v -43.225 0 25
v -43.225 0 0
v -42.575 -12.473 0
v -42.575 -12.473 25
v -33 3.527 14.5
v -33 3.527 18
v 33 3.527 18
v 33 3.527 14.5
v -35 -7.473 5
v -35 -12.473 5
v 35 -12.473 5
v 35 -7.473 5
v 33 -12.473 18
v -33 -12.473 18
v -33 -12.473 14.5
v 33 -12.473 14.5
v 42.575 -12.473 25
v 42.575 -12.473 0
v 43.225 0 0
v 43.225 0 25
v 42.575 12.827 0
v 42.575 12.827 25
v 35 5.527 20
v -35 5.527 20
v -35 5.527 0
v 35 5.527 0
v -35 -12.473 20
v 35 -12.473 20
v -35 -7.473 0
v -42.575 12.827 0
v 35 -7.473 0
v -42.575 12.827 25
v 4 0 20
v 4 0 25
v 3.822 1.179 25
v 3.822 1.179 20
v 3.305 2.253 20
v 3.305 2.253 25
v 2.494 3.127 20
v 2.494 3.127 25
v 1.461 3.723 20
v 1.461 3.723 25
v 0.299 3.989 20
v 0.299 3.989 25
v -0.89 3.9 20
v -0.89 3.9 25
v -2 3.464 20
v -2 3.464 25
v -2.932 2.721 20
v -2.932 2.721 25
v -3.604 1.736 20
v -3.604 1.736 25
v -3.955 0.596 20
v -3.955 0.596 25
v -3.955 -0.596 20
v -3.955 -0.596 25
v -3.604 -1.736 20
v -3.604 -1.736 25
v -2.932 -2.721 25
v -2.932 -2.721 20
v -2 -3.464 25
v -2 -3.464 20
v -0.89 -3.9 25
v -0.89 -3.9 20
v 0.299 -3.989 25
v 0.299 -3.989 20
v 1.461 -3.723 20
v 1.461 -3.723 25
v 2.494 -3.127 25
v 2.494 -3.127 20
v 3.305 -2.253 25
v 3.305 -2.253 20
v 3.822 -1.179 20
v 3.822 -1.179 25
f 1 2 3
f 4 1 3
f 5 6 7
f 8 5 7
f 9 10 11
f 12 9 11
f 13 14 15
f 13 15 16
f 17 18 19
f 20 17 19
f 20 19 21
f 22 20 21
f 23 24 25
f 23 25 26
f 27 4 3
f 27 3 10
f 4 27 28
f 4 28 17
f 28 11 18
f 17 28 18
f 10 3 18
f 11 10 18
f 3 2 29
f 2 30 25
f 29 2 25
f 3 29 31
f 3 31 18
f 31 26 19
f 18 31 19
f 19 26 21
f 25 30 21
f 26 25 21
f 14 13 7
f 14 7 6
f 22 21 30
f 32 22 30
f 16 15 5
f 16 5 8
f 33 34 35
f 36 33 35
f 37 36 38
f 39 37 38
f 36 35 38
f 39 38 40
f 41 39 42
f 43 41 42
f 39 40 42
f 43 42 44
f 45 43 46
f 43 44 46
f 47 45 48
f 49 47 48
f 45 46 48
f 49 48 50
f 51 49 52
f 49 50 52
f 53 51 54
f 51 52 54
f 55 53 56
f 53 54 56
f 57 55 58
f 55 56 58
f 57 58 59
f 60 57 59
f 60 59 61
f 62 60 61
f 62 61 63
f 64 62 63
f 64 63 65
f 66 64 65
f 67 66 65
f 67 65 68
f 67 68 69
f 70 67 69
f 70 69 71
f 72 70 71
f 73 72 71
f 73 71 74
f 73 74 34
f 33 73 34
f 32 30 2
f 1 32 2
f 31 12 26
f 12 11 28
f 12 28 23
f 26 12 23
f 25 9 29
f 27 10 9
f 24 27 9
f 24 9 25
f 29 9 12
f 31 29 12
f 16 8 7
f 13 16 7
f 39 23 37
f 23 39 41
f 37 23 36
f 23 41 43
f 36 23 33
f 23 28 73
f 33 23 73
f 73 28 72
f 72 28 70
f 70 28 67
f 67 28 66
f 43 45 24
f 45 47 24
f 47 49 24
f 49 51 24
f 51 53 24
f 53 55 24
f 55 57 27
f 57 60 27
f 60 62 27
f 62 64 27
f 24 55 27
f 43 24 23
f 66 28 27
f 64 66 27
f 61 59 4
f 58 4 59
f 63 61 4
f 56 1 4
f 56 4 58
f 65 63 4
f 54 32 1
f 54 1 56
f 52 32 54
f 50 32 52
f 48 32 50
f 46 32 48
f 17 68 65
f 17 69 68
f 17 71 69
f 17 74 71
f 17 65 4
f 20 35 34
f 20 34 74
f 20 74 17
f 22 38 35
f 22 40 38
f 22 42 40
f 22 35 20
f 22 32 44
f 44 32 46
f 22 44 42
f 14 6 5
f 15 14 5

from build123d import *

# Parameters (mm, degrees)
F1_DEPTH  = 25
F3_DEPTH  = 18
F5_DEPTH  = 4.13282
F6_R      = 4
F7_DEPTH  = 9
F8_W      = 70
F8_H      = 13
F9_DEPTH  = 25
F11_DEPTH = 16


with BuildPart() as f1:
    # F0 (on Top) → F1 (new body)
    with BuildSketch(Plane.XY):
        Polygon((42.575, 12.8273032203), (-42.575, 12.8273032203), (-43.225, 0), (-42.575, -12.4726967797), (42.575, -12.4726967797), (43.225, 0), align=None)
    extrude(amount=F1_DEPTH)

    # F2 (on face) → F3 (cut)
    with BuildSketch(Plane.XZ.offset(12.4726967797)):
        Polygon((35, 20), (0, 20), (-35, 20), (-35, 5), (35, 5), align=None)
    extrude(amount=-F3_DEPTH, mode=Mode.SUBTRACT)

    # F4 (on face) → F5 (cut)
    with BuildSketch(Plane.XY.offset(5)):
        Polygon((-35, -7.4726967797), (0, -7.4726967797), (35, -7.4726967797), (35, 5.5273032203), (-35, 5.5273032203), align=None)
    extrude(amount=-F5_DEPTH, mode=Mode.SUBTRACT)

    # F6 (on face) → F7 (cut)
    with BuildSketch(Plane.XY.offset(25)):
        Circle(F6_R)
    extrude(amount=-F7_DEPTH, mode=Mode.SUBTRACT)

    # F8 (on face) → F9 (cut)
    with BuildSketch(Plane.XY.offset(0.86718)):
        with Locations((0, -0.9726967797)):
            Rectangle(F8_W, F8_H)
    extrude(amount=-F9_DEPTH, mode=Mode.SUBTRACT)


with BuildPart() as f11:
    # F10 (on face) → F11 (new body)
    with BuildSketch(Plane.XZ.offset(12.4726967797)):
        Polygon((-33, 18), (-33, 14.5), (33, 14.5), (33, 16.4), (33, 18), align=None)
    extrude(amount=-F11_DEPTH)


solid = Compound([f1.part, f11.part])
